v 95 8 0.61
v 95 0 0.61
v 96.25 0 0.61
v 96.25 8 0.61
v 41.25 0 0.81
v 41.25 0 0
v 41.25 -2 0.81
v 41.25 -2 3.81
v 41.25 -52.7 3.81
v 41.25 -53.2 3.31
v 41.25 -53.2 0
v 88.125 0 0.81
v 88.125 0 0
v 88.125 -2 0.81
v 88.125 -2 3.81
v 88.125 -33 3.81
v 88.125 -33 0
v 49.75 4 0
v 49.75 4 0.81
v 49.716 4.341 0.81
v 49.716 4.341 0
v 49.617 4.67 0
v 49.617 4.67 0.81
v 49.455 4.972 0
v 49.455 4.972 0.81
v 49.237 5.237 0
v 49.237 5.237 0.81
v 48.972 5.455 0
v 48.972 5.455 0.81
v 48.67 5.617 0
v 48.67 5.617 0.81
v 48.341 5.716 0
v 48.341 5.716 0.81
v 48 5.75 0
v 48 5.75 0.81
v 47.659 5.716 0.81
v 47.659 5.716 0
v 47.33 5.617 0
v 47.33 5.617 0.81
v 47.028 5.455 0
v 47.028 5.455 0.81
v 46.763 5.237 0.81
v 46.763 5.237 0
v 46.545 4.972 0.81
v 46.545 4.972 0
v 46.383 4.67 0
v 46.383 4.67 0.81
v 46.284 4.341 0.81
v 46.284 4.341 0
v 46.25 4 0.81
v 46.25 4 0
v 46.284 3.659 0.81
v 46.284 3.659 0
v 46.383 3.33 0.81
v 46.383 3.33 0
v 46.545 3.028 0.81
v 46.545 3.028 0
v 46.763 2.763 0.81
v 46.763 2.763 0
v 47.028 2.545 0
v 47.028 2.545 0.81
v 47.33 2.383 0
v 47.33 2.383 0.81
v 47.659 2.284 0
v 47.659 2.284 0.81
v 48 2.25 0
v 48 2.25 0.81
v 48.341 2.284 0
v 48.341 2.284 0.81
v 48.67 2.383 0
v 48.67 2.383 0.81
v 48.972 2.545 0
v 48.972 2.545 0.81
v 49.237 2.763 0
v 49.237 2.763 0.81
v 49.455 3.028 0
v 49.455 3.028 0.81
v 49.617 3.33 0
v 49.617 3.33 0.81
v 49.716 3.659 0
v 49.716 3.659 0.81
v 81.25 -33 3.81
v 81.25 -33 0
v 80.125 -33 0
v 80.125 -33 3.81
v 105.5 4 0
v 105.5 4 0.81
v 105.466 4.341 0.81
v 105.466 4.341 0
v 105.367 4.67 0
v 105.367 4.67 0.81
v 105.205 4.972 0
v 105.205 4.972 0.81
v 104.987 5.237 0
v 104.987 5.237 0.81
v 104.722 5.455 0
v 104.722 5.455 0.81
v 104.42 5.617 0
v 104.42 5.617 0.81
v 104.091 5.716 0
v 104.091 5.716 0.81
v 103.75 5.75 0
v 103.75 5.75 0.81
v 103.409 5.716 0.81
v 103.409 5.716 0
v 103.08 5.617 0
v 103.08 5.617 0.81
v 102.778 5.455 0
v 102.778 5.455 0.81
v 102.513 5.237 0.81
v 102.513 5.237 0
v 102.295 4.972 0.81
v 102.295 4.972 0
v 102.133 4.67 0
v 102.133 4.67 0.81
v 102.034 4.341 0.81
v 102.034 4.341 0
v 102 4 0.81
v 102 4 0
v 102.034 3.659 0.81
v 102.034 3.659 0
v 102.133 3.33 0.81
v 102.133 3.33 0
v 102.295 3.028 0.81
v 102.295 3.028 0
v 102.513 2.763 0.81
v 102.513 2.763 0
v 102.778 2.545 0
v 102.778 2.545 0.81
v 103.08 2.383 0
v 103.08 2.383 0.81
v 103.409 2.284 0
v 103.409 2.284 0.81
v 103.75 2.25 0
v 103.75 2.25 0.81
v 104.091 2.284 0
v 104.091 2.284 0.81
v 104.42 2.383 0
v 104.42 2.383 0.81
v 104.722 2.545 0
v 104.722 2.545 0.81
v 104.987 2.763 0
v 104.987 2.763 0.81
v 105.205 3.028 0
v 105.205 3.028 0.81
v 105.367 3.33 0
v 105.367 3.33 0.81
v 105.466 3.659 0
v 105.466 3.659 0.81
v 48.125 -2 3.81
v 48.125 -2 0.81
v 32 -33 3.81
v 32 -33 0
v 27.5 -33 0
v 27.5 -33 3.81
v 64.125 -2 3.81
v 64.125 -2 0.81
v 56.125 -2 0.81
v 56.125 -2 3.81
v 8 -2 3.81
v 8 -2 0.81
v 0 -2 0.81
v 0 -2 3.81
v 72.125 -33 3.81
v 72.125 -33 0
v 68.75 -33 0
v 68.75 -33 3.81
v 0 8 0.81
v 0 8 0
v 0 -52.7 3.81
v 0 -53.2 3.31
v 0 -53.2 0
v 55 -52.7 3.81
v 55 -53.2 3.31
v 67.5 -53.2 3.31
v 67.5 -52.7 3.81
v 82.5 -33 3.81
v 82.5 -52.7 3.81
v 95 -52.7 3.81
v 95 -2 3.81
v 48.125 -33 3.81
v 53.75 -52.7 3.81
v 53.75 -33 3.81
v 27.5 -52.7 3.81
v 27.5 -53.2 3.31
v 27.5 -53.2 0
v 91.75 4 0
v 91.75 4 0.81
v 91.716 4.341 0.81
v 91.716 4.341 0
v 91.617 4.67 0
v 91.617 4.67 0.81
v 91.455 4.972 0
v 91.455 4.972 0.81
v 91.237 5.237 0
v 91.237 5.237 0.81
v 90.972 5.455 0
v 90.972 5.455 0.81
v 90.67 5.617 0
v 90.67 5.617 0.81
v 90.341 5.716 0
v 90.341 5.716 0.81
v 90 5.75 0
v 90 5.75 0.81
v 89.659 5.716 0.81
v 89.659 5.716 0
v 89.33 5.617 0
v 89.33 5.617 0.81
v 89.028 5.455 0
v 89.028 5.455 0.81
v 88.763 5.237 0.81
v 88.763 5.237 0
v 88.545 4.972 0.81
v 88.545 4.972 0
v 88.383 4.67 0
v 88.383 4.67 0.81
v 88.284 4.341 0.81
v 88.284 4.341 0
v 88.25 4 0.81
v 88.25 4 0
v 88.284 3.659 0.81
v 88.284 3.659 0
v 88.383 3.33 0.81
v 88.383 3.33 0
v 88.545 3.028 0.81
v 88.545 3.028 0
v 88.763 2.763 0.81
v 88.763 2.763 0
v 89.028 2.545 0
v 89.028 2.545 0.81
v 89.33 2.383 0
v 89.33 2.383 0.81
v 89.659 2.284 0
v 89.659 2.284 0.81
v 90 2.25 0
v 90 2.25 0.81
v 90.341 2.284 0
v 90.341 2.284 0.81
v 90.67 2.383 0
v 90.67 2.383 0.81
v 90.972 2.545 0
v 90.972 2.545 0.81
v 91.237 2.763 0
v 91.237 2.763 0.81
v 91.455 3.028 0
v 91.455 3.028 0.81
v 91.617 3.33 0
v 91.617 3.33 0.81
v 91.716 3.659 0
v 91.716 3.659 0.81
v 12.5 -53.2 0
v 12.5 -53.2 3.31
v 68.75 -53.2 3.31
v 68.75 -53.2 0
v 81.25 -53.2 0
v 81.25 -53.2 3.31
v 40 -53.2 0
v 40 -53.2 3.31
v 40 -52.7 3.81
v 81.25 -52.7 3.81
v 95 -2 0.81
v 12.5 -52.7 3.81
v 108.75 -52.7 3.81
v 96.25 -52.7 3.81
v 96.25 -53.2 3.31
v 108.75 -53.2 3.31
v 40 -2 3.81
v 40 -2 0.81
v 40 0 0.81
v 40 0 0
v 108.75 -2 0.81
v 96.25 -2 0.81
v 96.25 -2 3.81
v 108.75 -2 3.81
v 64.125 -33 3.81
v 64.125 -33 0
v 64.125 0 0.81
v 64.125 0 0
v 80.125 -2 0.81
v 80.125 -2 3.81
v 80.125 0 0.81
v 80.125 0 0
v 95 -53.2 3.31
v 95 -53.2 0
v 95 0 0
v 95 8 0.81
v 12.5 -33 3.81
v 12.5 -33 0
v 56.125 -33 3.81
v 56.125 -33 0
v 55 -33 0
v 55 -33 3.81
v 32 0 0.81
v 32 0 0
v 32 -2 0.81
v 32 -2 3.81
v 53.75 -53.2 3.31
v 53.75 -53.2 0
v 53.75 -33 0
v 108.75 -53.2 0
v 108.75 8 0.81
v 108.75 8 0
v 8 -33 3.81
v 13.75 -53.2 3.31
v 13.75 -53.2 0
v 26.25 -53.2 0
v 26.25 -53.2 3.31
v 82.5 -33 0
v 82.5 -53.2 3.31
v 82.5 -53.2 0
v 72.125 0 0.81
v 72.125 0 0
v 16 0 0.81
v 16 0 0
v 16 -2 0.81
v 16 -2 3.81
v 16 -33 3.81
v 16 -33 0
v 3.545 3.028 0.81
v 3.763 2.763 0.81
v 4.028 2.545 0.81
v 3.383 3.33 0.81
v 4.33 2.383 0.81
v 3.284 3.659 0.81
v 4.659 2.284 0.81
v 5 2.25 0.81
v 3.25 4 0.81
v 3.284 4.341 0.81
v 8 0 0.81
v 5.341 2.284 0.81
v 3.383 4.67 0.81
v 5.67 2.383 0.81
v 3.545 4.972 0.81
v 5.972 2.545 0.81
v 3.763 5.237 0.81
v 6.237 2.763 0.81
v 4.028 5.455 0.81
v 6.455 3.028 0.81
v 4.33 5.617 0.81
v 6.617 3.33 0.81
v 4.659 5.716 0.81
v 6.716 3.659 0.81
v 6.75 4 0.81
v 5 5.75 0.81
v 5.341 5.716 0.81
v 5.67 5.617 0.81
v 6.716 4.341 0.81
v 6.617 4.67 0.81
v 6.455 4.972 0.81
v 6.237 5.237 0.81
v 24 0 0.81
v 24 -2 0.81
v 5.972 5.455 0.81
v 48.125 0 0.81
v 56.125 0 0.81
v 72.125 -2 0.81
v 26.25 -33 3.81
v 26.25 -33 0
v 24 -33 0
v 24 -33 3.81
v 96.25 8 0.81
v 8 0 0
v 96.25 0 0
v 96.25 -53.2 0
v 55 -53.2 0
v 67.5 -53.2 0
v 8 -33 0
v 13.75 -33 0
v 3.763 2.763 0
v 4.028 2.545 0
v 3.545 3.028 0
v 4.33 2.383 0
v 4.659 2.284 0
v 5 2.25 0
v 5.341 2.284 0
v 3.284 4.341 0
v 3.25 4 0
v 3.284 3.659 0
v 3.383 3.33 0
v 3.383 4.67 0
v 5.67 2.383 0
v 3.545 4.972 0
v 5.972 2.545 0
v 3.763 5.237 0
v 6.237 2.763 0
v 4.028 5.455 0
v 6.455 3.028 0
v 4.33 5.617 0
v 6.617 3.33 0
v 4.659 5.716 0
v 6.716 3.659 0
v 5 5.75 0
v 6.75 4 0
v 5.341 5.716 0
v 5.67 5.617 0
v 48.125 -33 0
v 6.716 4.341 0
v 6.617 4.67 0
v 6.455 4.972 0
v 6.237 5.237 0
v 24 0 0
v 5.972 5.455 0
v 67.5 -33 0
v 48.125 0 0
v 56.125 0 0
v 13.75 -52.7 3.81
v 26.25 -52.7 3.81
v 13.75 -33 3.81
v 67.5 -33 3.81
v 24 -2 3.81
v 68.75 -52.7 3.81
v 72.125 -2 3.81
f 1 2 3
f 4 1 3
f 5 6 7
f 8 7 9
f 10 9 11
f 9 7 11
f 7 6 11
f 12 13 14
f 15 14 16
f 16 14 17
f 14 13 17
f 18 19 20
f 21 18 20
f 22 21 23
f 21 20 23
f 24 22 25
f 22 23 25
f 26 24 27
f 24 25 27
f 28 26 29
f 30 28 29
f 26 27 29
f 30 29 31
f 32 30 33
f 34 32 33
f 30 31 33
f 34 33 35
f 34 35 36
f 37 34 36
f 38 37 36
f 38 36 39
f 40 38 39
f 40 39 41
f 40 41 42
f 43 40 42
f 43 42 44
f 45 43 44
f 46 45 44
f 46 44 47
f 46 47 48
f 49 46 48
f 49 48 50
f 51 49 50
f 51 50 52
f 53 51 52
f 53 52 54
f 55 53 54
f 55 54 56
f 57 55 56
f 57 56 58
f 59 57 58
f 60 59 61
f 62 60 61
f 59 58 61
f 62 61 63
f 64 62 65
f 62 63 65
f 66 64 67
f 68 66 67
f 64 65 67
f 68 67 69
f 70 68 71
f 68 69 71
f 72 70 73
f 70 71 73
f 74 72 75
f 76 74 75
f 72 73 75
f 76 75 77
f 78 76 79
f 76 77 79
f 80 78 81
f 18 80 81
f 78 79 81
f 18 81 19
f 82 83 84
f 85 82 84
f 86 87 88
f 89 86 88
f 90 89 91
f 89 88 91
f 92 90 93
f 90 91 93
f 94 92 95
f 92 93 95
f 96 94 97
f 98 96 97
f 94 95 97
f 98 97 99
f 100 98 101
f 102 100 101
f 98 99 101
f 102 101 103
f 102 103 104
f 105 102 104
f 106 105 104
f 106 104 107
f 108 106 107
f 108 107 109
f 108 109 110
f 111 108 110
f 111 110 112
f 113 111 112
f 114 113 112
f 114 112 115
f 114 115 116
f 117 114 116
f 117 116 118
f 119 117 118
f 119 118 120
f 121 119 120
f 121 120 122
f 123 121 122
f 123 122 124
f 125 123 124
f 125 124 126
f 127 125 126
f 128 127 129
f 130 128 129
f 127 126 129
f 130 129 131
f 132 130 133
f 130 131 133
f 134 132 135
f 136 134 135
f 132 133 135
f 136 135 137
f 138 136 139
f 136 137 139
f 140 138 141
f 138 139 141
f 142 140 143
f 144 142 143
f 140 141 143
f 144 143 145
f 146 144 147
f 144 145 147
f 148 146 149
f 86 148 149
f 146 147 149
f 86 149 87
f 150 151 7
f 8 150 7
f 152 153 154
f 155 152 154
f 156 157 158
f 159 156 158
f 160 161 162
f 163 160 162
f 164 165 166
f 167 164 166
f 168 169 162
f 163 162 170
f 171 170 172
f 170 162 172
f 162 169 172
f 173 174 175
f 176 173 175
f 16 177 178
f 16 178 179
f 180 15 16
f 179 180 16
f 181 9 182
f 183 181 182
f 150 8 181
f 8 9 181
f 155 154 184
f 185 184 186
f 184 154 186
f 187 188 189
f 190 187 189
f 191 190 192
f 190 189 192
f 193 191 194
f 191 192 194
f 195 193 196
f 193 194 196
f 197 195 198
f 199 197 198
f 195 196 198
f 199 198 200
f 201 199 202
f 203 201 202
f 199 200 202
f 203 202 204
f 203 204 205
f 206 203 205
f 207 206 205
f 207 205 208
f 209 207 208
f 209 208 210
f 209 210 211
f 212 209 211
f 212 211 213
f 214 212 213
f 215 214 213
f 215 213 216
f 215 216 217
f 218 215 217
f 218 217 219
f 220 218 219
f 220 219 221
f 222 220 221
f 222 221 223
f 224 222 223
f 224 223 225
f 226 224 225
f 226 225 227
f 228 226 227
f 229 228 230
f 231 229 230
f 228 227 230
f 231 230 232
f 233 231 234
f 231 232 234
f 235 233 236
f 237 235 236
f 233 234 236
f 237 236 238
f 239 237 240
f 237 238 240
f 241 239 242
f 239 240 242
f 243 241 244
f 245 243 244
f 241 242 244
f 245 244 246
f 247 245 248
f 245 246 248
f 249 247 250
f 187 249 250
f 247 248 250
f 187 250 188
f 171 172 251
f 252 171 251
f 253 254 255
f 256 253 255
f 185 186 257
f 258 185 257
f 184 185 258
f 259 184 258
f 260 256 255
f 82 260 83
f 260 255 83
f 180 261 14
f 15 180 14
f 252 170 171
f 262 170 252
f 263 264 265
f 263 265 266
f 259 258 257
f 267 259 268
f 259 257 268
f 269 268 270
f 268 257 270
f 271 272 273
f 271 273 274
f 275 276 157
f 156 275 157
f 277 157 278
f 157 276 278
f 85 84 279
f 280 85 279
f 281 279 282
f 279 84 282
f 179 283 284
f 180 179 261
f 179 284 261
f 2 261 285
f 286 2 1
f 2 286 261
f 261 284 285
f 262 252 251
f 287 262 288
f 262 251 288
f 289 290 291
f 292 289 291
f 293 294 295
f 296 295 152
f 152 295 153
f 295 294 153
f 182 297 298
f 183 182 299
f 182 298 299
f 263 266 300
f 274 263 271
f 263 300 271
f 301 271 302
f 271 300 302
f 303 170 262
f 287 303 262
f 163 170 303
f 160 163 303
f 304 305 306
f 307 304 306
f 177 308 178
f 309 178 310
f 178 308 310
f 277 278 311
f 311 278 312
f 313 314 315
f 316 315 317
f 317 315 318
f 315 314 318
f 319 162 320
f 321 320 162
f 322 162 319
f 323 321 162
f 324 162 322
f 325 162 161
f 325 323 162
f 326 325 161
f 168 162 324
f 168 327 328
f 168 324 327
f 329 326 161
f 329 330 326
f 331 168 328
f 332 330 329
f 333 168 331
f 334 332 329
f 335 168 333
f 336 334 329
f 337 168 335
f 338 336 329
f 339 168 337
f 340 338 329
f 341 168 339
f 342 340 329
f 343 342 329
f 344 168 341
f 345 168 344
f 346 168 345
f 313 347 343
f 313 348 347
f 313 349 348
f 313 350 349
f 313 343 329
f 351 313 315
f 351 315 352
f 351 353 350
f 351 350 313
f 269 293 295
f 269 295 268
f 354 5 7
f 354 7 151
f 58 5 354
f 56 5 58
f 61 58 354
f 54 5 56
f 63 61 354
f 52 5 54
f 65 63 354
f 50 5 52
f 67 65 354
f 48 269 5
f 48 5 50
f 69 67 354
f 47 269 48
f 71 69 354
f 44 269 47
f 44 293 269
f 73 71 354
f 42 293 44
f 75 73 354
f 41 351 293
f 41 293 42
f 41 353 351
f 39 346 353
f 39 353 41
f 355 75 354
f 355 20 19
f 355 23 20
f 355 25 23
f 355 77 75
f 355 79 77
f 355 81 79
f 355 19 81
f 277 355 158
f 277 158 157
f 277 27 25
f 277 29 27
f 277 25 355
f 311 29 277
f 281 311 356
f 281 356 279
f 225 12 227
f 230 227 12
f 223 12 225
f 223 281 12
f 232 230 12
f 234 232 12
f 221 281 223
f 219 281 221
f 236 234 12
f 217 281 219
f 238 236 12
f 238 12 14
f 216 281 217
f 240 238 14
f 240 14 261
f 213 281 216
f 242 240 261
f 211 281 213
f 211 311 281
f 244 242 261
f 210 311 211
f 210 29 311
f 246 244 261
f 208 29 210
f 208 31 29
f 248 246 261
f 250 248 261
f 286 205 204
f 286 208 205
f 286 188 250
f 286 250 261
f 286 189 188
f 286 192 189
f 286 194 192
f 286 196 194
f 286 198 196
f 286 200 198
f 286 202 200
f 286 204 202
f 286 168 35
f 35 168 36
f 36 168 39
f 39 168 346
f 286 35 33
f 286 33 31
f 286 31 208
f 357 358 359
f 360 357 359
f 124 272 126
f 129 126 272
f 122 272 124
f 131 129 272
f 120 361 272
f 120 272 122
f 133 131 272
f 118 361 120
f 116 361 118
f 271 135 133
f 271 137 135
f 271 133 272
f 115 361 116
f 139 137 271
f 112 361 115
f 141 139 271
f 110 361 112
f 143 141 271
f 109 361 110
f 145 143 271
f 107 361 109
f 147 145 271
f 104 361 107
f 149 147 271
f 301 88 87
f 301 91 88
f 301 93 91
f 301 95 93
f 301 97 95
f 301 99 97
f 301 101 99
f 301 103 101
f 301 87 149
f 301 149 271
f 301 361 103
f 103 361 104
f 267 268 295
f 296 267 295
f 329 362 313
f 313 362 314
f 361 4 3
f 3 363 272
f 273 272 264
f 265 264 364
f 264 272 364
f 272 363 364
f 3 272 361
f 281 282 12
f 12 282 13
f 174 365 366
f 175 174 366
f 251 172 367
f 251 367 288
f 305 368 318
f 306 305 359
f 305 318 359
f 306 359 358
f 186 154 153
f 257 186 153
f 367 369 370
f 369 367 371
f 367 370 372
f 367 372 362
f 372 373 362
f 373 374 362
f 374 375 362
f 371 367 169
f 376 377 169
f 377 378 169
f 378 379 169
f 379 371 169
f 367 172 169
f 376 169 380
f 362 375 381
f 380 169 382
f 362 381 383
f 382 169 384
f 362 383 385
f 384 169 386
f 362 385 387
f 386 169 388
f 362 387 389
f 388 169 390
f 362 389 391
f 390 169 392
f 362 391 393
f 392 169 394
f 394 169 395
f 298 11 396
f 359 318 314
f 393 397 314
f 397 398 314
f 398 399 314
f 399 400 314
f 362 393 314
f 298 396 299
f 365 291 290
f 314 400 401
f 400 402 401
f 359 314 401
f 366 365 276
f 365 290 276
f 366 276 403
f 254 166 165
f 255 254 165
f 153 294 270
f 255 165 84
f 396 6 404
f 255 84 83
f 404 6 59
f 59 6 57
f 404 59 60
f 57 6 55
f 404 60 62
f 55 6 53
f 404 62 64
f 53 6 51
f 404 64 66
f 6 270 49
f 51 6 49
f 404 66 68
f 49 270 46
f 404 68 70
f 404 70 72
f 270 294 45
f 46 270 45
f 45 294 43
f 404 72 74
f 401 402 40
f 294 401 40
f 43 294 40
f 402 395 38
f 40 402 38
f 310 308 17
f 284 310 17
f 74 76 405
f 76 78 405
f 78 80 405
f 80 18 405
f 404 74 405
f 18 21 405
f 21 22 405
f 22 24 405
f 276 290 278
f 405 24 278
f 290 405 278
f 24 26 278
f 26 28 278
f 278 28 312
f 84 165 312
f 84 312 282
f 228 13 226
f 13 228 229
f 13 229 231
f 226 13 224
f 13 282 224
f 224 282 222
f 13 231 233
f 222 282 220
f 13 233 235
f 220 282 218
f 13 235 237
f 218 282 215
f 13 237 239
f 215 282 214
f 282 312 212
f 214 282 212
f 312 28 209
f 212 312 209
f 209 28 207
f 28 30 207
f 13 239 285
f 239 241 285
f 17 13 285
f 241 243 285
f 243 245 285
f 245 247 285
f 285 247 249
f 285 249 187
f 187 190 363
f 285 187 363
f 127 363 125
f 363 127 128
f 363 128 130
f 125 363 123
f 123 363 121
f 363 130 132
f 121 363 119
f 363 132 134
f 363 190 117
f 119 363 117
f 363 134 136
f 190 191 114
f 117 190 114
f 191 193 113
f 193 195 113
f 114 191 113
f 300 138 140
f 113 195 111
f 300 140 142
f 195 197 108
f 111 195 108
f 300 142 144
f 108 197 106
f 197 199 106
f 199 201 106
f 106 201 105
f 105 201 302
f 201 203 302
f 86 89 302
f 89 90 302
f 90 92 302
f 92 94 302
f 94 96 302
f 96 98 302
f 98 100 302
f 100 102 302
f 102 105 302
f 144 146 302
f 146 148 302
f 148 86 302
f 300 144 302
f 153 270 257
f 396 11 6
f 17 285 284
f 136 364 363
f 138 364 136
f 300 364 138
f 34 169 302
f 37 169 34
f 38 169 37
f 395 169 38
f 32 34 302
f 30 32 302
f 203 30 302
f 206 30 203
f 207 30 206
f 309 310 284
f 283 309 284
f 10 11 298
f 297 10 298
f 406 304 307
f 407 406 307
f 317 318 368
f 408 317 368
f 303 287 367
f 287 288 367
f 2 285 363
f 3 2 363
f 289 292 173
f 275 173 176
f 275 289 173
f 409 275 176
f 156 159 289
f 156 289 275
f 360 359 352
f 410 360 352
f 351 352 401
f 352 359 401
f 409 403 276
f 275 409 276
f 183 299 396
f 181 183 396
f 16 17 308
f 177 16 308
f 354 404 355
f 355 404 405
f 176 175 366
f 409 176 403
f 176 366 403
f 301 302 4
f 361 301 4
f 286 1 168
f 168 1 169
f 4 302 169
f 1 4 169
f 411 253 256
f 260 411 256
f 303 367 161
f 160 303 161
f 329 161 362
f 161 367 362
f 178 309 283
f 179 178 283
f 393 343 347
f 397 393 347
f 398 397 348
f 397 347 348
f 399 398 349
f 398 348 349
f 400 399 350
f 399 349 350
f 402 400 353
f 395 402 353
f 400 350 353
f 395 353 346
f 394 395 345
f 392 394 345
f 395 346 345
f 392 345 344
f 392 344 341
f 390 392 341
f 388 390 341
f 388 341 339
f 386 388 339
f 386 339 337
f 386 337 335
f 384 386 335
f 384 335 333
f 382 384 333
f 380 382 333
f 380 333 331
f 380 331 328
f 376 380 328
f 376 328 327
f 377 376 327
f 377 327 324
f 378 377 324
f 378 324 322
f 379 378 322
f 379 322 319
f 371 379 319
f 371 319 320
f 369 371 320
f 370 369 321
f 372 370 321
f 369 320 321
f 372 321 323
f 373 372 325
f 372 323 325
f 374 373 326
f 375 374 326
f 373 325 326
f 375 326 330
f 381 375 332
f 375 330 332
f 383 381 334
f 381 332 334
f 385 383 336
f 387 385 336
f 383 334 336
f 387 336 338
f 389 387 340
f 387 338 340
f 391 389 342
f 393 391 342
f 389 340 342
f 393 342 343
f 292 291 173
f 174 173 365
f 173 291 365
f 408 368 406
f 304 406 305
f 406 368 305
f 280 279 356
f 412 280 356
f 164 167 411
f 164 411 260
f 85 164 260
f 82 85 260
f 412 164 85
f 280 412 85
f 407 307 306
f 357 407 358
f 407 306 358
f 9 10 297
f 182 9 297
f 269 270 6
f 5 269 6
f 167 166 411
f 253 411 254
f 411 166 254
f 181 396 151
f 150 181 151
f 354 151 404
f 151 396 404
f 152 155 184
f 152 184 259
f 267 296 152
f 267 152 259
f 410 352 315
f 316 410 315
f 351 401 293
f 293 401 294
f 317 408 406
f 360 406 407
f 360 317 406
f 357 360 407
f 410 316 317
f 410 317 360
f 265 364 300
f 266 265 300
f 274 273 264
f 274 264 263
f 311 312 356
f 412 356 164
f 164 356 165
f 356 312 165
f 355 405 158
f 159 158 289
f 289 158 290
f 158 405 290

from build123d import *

# Parameters (mm, degrees)
PAD_DEPTH       = 0.81
SKETCH001_W     = 12.5
SKETCH001_H     = 51.2
PAD001_DEPTH    = 3
SKETCH002_R     = 1.75
POCKET_DEPTH    = 5
SKETCH003_W     = 1.25
SKETCH003_H     = 8
POCKET001_DEPTH = 0.2
CHAMFER_SIZE    = 0.5


with BuildPart() as part:
    # Sketch → Pad (new body)
    with BuildSketch(Plane.XY):
        Polygon((0, 0), (0, -53.2), (12.5, -53.2), (12.5, -33), (8, -33), (8, 0), (16, 0), (16, -33), (13.75, -33), (13.75, -53.2), (26.25, -53.2), (26.25, -33), (24, -33), (24, 0), (32, 0), (32, -33), (27.5, -33), (27.5, -53.2), (40, -53.2), (40, 0), (41.25, 0), (41.25, -53.2), (53.75, -53.2), (53.75, -33), (48.125, -33), (48.125, 0), (56.125, 0), (56.125, -33), (55, -33), (55, -53.2), (67.5, -53.2), (67.5, -33), (64.125, -33), (64.125, 0), (72.125, 0), (72.125, -33), (68.75, -33), (68.75, -53.2), (81.25, -53.2), (81.25, -33), (80.125, -33), (80.125, 0), (88.125, 0), (88.125, -33), (82.5, -33), (82.5, -53.2), (95, -53.2), (95, 0), (96.25, 0), (96.25, -53.2), (108.75, -53.2), (108.75, 0), (108.75, 8), (0, 8), align=None)
    extrude(amount=PAD_DEPTH)

    # Sketch001 (on Face56 of Pad) → Pad001 (join)
    with BuildSketch(Plane.XY.offset(0.81)):
        Polygon((0, -2), (0, -53.2), (12.5, -53.2), (12.5, -33), (8, -33), (8, -2), align=None)
        Polygon((16, -2), (16, -33), (13.75, -33), (13.75, -53.2), (26.25, -53.2), (26.25, -33), (24, -33), (24, -2), align=None)
        Polygon((32, -2), (32, -33), (27.5, -33), (27.5, -53.2), (40, -53.2), (40, -2), align=None)
        Polygon((41.25, -2), (41.25, -53.2), (53.75, -53.2), (53.75, -33), (48.125, -33), (48.125, -2), align=None)
        Polygon((56.125, -2), (56.125, -33), (55, -33), (55, -53.2), (67.5, -53.2), (67.5, -33), (64.125, -33), (64.125, -2), align=None)
        Polygon((72.125, -2), (72.125, -33), (68.75, -33), (68.75, -53.2), (81.25, -53.2), (81.25, -33), (80.125, -33), (80.125, -2), align=None)
        Polygon((88.125, -2), (88.125, -33), (82.5, -33), (82.5, -53.2), (95, -53.2), (95, -2), align=None)
        with Locations((102.5, -27.6)):
            Rectangle(SKETCH001_W, SKETCH001_H)
    extrude(amount=PAD001_DEPTH)

    # Sketch002 (on Face5 of Pad001) → Pocket (cut)
    with BuildSketch(Plane.XY.offset(0.81)):
        with Locations((5, 4)):
            Circle(SKETCH002_R)
        with Locations((48, 4)):
            Circle(SKETCH002_R)
        with Locations((90, 4)):
            Circle(SKETCH002_R)
        with Locations((103.75, 4)):
            Circle(SKETCH002_R)
    extrude(amount=-POCKET_DEPTH, mode=Mode.SUBTRACT)

    # Sketch003 (on Face5 of Pocket) → Pocket001 (cut)
    with BuildSketch(Plane.XY.offset(0.81)):
        with Locations((95.625, 4)):
            Rectangle(SKETCH003_W, SKETCH003_H)
    extrude(amount=-POCKET001_DEPTH, mode=Mode.SUBTRACT)

    # Chamfer
    chamfer_edges = [part.edges().sort_by_distance(p)[0] for p in [
        (6.25, -53.2, 3.81),
        (20, -53.2, 3.81),
        (33.75, -53.2, 3.81),
        (47.5, -53.2, 3.81),
        (61.25, -53.2, 3.81),
        (75, -53.2, 3.81),
        (88.75, -53.2, 3.81),
        (102.5, -53.2, 3.81),
    ]]
    chamfer(chamfer_edges, length=CHAMFER_SIZE)


solid = part.part
